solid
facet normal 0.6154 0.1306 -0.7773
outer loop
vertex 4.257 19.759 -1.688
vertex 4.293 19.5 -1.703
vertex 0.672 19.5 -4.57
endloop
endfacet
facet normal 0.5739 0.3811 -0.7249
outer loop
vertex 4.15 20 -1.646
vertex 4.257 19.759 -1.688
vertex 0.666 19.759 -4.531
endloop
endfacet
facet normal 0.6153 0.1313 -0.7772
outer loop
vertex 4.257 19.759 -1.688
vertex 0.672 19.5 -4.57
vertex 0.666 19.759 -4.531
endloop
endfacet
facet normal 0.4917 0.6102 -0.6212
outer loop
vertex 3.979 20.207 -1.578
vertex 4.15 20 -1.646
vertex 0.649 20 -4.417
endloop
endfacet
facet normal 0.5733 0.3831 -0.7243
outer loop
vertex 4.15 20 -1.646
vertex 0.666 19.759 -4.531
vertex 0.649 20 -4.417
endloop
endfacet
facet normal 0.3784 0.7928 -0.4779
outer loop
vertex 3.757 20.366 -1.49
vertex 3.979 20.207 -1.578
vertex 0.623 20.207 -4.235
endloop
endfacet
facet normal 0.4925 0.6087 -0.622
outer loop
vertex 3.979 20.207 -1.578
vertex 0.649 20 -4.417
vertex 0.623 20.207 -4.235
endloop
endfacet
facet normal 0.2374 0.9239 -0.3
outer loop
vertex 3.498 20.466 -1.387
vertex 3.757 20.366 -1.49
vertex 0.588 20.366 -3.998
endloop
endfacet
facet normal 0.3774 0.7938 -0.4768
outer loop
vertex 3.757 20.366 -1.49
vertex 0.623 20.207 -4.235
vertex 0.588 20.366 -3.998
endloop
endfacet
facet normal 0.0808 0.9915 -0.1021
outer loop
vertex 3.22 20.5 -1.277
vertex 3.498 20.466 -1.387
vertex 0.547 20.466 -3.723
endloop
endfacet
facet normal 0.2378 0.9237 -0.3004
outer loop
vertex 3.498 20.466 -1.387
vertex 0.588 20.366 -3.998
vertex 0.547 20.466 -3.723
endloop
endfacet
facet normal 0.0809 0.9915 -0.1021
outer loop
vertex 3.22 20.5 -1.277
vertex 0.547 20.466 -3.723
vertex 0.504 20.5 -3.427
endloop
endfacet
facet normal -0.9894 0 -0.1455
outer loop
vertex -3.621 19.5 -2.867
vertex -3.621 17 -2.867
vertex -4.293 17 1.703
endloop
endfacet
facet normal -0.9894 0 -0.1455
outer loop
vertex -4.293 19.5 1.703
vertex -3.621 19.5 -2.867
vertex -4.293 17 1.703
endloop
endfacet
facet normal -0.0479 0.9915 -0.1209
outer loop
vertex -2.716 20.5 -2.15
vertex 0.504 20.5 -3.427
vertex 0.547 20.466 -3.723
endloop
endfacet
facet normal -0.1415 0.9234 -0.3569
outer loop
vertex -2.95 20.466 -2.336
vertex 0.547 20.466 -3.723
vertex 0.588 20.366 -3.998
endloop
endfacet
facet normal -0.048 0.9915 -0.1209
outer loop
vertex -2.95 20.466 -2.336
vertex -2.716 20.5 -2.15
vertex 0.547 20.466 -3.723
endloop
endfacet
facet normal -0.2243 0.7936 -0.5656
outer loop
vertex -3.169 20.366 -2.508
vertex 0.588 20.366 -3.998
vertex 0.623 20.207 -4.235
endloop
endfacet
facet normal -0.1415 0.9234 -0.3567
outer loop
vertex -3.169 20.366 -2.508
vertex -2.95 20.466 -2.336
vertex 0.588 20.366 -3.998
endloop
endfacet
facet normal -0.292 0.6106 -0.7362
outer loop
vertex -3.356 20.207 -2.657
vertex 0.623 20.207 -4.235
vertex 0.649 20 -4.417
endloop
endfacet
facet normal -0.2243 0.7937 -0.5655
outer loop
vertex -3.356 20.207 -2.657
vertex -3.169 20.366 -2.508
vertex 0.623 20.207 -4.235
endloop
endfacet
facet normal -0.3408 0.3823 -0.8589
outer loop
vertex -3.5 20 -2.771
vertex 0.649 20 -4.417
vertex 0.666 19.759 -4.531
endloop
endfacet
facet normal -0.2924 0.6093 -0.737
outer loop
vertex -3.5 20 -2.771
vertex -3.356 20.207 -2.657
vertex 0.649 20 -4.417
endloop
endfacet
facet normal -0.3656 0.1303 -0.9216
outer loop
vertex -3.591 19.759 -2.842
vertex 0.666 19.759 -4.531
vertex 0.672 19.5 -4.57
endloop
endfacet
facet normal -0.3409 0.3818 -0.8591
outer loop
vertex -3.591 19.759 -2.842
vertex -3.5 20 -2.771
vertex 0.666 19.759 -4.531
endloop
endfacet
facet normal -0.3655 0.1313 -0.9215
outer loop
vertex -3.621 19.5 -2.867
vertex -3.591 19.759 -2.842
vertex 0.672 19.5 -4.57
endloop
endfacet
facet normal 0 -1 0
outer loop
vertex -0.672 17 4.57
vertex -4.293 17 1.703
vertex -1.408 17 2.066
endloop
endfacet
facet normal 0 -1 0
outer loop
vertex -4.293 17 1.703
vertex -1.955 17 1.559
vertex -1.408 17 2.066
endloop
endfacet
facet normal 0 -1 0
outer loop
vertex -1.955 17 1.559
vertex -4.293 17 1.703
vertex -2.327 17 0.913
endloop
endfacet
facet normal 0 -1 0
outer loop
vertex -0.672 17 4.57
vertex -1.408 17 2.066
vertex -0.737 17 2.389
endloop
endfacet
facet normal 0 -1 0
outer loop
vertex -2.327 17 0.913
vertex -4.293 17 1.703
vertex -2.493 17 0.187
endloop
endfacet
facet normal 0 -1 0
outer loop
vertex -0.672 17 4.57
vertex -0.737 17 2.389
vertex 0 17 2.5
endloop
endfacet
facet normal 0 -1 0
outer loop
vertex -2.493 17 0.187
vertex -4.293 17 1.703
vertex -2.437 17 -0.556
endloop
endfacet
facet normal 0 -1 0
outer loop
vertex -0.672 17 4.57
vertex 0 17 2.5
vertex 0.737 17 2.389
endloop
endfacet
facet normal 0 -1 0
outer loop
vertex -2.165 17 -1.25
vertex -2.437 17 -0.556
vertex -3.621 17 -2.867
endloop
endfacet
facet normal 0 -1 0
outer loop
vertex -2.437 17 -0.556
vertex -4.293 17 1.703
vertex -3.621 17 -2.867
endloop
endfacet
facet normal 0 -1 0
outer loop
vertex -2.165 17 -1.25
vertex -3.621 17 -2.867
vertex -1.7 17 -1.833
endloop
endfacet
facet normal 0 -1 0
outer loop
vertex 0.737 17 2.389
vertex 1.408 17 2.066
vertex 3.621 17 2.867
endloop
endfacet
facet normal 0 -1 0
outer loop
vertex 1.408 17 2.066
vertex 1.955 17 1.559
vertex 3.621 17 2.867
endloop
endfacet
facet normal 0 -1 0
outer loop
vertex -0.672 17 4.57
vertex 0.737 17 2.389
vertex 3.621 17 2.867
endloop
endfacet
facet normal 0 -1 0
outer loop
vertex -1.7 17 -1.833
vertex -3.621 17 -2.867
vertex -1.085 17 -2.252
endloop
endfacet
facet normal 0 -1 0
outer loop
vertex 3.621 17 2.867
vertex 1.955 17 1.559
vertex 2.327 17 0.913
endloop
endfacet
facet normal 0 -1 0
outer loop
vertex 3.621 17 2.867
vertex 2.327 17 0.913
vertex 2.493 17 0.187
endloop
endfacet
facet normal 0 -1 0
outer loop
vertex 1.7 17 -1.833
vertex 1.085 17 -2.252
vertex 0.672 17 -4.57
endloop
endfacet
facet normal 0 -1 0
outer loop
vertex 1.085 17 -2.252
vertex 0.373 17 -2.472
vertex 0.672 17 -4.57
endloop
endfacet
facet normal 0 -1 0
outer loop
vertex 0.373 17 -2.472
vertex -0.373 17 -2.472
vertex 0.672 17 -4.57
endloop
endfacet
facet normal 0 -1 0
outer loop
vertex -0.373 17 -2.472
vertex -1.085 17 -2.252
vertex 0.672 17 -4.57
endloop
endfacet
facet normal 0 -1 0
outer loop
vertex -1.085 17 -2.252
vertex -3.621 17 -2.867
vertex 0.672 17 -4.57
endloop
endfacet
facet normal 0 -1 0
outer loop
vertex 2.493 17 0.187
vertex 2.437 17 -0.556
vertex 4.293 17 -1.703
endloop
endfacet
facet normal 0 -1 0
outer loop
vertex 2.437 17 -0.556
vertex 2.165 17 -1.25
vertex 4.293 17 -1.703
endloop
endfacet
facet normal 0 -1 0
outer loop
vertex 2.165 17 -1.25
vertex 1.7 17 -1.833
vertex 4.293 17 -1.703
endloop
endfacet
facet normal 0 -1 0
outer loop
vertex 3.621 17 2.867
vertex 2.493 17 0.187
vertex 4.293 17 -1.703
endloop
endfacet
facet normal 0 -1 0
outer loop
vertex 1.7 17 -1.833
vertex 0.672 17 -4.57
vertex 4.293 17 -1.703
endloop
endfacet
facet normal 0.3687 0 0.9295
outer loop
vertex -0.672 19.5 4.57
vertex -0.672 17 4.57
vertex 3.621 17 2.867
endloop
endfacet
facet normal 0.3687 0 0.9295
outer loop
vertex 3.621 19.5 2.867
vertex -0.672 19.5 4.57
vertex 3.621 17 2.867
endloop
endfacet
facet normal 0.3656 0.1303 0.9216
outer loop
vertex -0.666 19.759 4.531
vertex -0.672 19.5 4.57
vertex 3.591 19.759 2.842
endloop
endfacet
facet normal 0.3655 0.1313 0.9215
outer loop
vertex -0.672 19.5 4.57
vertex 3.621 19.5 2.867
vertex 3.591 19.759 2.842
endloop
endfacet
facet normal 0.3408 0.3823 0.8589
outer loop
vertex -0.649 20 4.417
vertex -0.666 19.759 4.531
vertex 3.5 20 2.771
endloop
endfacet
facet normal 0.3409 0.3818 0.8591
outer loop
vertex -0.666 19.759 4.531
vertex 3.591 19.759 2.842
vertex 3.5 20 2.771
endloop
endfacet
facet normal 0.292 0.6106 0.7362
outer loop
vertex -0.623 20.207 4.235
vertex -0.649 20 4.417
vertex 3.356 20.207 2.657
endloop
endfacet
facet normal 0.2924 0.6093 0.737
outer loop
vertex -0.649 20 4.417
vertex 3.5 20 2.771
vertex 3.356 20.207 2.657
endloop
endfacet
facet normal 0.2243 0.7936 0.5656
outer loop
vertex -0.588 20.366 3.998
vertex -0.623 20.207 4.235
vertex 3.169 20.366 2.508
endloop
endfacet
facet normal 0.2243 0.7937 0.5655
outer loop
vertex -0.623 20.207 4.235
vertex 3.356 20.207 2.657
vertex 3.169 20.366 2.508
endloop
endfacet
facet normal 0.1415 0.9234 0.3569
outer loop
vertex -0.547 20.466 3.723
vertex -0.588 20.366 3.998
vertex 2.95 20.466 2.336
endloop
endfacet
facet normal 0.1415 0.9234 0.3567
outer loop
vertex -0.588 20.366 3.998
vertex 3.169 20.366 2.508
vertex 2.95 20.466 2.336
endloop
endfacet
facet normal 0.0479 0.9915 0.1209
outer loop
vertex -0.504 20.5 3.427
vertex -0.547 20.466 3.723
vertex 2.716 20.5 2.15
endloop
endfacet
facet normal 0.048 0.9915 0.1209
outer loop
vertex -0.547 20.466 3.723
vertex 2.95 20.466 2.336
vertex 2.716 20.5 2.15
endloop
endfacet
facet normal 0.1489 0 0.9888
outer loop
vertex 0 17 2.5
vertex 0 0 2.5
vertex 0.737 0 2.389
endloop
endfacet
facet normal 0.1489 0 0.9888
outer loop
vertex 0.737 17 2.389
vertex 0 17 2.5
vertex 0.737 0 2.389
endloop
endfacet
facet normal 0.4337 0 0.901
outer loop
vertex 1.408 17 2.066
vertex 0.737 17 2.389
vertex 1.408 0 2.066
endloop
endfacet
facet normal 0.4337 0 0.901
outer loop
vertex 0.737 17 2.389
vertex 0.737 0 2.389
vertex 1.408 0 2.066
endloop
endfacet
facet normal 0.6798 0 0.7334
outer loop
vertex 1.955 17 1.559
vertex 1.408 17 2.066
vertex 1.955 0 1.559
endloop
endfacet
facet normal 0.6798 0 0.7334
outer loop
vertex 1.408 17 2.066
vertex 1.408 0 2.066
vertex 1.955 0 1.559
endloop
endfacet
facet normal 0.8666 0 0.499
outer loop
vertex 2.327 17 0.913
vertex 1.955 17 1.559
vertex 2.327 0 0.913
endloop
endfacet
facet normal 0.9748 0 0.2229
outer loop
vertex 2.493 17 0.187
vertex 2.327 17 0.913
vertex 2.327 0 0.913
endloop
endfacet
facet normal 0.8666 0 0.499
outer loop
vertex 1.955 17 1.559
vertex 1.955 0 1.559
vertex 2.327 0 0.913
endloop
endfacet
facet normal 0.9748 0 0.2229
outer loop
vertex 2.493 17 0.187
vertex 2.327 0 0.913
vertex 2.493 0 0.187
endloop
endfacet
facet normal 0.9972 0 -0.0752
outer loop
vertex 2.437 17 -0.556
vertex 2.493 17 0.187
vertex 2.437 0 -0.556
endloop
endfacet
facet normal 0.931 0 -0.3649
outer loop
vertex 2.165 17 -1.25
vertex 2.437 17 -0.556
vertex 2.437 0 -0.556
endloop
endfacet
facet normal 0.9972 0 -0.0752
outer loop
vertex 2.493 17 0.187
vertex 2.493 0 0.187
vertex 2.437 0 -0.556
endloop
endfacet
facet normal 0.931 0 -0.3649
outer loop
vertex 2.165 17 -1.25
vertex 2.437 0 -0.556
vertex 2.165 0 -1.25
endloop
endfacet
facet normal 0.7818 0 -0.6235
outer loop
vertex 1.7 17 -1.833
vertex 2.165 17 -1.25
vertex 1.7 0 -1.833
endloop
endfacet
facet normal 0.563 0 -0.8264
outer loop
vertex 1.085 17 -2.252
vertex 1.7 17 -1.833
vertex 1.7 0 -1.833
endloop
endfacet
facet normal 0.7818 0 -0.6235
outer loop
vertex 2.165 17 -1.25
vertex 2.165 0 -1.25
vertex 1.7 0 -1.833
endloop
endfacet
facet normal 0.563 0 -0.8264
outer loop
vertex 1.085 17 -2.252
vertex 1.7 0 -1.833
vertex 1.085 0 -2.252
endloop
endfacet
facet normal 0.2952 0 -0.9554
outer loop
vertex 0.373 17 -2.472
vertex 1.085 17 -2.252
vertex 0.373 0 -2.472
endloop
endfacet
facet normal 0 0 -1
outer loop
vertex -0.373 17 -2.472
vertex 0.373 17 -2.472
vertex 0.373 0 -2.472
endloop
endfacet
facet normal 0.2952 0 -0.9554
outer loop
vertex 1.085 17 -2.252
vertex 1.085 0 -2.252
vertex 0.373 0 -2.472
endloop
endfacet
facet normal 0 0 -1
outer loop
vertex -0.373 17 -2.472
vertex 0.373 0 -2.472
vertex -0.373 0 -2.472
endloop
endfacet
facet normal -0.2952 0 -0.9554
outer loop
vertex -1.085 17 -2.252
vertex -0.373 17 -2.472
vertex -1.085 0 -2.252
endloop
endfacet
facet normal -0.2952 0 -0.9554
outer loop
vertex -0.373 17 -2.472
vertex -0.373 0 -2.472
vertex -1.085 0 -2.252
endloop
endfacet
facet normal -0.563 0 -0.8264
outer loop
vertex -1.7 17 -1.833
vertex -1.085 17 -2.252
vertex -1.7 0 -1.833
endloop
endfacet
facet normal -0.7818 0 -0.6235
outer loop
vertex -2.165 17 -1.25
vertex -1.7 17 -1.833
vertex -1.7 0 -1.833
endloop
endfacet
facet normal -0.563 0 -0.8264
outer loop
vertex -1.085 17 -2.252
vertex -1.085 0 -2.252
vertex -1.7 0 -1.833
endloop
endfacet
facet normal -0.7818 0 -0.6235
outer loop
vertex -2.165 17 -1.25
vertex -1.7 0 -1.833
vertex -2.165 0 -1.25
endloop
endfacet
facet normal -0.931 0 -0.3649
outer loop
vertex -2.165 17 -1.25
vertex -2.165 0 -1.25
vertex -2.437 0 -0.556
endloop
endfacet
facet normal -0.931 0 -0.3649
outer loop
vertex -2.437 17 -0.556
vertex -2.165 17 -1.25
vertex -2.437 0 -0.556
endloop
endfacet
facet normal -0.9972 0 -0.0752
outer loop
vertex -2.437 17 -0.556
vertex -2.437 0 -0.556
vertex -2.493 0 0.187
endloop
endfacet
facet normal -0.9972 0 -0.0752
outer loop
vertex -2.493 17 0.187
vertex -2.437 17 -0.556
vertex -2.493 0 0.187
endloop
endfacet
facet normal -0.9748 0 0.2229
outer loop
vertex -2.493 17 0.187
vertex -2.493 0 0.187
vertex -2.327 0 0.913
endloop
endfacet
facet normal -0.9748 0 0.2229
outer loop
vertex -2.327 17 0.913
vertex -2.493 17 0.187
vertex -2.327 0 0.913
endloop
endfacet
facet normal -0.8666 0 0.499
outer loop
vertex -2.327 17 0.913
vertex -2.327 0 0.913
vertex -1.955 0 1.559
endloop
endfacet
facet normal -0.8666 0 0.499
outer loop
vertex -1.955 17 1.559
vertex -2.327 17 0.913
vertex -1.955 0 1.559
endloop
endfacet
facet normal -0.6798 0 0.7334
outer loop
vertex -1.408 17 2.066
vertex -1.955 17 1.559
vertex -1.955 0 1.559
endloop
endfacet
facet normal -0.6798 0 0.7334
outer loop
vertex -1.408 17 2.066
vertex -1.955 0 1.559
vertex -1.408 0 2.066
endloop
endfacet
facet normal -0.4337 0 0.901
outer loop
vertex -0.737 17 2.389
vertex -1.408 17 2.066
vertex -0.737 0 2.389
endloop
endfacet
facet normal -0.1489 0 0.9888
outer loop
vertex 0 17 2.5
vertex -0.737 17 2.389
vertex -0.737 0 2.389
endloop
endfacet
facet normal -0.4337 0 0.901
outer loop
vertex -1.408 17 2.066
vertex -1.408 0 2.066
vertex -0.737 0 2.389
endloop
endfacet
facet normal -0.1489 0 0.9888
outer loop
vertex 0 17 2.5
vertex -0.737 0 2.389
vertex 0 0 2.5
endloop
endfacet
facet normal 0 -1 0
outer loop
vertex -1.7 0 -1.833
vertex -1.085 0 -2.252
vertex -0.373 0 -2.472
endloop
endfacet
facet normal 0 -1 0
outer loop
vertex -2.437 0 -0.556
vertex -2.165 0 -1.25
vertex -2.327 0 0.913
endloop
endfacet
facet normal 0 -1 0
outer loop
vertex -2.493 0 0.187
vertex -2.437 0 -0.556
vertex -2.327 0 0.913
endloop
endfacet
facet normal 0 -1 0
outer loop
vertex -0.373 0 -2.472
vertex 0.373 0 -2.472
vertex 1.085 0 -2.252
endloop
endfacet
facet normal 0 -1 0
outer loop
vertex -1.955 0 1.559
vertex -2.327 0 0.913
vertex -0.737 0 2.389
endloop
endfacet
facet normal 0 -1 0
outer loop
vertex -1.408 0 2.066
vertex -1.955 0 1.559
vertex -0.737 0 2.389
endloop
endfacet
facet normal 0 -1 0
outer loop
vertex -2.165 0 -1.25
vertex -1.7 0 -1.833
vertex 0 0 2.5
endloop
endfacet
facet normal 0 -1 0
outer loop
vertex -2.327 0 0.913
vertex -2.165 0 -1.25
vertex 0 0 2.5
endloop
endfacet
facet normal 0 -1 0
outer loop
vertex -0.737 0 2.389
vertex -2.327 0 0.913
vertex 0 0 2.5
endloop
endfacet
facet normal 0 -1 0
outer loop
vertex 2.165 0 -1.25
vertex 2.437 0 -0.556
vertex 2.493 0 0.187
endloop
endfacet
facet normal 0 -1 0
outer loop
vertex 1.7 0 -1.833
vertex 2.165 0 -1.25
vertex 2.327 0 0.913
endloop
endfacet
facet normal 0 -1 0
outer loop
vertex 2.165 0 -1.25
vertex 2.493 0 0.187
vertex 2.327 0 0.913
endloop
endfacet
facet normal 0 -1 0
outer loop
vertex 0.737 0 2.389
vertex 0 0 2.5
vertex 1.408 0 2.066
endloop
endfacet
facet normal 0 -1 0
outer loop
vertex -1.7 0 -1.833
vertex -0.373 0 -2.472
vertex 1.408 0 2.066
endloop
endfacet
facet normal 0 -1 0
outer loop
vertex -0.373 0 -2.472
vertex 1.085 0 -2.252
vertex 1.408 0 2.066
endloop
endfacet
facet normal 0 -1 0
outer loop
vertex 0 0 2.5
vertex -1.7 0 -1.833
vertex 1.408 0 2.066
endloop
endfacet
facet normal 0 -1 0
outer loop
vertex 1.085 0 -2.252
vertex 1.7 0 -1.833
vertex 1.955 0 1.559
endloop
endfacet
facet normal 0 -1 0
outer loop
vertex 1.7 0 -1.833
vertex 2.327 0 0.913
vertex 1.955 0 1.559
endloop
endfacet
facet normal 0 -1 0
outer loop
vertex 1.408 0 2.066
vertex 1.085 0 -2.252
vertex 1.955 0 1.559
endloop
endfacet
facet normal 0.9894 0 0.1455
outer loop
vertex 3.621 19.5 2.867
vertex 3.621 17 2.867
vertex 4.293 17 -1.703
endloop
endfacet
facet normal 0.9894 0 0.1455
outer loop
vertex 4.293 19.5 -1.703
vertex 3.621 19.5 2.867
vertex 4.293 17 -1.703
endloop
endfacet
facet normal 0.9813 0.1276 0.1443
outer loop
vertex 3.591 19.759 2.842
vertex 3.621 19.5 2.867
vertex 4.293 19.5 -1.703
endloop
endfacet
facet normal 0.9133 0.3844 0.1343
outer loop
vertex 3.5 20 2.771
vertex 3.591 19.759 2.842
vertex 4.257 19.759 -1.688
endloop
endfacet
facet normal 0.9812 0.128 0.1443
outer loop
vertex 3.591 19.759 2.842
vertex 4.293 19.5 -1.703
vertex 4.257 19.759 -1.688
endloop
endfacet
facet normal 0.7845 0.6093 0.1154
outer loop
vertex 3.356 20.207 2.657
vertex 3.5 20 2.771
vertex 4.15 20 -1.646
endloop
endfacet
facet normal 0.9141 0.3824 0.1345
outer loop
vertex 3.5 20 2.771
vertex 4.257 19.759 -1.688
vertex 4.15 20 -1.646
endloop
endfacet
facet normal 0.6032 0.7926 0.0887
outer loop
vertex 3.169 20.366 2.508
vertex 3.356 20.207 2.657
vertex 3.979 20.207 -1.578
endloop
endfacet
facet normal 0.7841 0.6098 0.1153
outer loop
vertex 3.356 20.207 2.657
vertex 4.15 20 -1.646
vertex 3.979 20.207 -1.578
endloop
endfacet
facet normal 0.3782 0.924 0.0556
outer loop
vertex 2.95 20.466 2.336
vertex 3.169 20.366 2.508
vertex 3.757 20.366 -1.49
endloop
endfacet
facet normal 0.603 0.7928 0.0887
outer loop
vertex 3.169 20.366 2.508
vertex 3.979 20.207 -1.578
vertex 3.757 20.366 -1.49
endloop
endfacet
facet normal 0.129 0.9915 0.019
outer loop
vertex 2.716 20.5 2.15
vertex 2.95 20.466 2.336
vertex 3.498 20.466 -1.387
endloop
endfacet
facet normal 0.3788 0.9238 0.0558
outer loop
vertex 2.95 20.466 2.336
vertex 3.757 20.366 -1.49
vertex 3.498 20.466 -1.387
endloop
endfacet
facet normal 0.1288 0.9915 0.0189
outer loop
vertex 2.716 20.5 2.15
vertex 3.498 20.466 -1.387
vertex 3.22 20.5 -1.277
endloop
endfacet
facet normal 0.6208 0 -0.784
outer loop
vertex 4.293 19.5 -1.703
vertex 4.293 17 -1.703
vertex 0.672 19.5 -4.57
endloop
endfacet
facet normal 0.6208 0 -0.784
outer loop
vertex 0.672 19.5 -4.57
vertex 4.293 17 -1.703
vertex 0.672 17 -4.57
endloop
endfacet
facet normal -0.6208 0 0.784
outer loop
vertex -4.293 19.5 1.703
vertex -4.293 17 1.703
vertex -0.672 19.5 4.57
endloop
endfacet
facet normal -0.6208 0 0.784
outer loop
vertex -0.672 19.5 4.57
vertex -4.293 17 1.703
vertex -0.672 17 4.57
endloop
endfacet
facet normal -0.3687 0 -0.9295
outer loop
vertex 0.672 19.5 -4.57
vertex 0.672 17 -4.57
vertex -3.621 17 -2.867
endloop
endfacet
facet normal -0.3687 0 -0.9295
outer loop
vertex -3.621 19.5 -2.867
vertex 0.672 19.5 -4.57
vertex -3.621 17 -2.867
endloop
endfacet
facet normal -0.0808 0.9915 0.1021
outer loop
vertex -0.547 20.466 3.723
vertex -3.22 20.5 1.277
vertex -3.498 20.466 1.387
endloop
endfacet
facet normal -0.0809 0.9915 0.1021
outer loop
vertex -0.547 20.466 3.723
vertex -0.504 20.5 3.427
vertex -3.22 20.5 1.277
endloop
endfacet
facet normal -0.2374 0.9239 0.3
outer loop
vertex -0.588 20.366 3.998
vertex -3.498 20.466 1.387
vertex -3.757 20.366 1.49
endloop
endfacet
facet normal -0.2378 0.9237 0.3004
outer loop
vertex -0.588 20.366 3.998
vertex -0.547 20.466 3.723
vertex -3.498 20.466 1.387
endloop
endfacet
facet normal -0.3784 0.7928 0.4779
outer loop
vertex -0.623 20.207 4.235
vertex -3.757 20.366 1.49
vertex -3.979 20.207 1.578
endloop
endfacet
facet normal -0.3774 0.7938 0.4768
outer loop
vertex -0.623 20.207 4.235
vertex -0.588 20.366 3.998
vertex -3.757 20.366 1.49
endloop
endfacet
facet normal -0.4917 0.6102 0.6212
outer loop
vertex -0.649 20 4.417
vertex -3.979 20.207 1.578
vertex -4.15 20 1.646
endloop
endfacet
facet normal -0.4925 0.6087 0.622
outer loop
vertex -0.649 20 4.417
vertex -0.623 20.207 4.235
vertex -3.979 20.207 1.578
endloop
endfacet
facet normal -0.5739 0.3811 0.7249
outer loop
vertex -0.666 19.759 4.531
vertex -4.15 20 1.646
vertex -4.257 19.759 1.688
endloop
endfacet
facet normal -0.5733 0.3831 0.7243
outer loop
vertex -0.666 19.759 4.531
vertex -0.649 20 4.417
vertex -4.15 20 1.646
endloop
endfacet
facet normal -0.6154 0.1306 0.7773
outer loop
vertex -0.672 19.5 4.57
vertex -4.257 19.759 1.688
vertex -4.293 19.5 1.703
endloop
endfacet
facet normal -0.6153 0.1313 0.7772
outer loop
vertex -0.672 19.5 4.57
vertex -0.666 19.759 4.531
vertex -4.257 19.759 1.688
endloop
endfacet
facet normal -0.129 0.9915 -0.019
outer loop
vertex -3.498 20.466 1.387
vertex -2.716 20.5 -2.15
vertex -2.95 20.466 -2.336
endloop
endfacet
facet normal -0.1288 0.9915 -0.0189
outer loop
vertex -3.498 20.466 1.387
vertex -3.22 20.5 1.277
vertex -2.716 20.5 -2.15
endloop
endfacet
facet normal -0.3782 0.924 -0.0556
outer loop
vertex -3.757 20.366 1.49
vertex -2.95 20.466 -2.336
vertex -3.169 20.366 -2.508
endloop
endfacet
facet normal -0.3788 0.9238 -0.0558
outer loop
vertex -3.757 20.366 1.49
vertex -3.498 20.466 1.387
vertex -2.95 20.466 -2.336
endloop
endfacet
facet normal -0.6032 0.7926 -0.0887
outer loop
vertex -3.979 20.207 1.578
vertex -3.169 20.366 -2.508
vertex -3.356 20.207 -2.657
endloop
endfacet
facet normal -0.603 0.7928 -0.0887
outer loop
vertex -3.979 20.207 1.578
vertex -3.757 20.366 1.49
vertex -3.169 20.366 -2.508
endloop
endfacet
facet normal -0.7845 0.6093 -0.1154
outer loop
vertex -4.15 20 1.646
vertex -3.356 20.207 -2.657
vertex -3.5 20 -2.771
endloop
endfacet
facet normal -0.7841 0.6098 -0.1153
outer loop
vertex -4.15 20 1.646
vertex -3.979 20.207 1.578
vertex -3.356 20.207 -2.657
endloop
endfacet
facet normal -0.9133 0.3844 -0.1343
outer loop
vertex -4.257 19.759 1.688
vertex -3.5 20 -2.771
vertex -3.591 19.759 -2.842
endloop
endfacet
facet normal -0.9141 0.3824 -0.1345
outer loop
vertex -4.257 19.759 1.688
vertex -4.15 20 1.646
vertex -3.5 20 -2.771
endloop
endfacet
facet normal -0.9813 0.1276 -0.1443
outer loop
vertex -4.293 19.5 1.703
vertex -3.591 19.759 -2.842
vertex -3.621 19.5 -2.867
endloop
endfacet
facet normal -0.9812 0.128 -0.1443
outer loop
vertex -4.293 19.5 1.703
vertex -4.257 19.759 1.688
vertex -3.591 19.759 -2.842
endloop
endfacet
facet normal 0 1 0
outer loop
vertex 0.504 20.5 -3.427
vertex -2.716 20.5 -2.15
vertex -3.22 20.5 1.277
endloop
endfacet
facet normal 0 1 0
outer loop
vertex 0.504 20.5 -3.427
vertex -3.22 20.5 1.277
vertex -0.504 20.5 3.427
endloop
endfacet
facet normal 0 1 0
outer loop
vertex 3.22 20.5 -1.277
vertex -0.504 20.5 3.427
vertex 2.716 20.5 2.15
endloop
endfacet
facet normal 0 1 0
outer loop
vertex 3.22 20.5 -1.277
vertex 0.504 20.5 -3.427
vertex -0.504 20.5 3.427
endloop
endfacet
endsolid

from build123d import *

# Parameters (mm, degrees)
SKETCH_1_R      = 2.5
EXTRUDE_1_DEPTH = 17
EXTRUDE_2_DEPTH = 3.5
FILLET_1_R      = 1


with BuildPart() as part:
    # Эскиз1 → Вытянуть1 (new body)
    with BuildSketch(Plane(origin=(0, 0, 0), x_dir=(1, 0, 0), z_dir=(0, 1, 0))):
        with Locations(Location((0, 0, 0), (0, 0, 270))):
            Circle(SKETCH_1_R)
    extrude(amount=EXTRUDE_1_DEPTH)

    # Эскиз2 → Вытянуть2 (add)
    with BuildSketch(Plane(origin=(0, 17, 0), x_dir=(1, 0, 0), z_dir=(0, 1, 0))):
        Polygon((3.621435705, -2.866799046), (4.293438654, 1.702855795), (0.672002949, 4.569654841), (-3.621435705, 2.866799046), (-4.293438654, -1.702855795), (-0.672002949, -4.569654841), align=None)
    extrude(amount=EXTRUDE_2_DEPTH)

    # Скругление1
    fillet_1_edges = [part.edges().sort_by_distance(p)[0] for p in [
        (1.474716378, 20.5, 3.718226944),
        (3.957437179, 20.5, 0.581971625),
        (2.482720801, 20.5, -3.136255318),
        (-1.474716378, 20.5, -3.718226944),
        (-3.957437179, 20.5, -0.581971625),
        (-2.482720801, 20.5, 3.136255318),
    ]]
    fillet(fillet_1_edges, radius=FILLET_1_R)


solid = part.part
